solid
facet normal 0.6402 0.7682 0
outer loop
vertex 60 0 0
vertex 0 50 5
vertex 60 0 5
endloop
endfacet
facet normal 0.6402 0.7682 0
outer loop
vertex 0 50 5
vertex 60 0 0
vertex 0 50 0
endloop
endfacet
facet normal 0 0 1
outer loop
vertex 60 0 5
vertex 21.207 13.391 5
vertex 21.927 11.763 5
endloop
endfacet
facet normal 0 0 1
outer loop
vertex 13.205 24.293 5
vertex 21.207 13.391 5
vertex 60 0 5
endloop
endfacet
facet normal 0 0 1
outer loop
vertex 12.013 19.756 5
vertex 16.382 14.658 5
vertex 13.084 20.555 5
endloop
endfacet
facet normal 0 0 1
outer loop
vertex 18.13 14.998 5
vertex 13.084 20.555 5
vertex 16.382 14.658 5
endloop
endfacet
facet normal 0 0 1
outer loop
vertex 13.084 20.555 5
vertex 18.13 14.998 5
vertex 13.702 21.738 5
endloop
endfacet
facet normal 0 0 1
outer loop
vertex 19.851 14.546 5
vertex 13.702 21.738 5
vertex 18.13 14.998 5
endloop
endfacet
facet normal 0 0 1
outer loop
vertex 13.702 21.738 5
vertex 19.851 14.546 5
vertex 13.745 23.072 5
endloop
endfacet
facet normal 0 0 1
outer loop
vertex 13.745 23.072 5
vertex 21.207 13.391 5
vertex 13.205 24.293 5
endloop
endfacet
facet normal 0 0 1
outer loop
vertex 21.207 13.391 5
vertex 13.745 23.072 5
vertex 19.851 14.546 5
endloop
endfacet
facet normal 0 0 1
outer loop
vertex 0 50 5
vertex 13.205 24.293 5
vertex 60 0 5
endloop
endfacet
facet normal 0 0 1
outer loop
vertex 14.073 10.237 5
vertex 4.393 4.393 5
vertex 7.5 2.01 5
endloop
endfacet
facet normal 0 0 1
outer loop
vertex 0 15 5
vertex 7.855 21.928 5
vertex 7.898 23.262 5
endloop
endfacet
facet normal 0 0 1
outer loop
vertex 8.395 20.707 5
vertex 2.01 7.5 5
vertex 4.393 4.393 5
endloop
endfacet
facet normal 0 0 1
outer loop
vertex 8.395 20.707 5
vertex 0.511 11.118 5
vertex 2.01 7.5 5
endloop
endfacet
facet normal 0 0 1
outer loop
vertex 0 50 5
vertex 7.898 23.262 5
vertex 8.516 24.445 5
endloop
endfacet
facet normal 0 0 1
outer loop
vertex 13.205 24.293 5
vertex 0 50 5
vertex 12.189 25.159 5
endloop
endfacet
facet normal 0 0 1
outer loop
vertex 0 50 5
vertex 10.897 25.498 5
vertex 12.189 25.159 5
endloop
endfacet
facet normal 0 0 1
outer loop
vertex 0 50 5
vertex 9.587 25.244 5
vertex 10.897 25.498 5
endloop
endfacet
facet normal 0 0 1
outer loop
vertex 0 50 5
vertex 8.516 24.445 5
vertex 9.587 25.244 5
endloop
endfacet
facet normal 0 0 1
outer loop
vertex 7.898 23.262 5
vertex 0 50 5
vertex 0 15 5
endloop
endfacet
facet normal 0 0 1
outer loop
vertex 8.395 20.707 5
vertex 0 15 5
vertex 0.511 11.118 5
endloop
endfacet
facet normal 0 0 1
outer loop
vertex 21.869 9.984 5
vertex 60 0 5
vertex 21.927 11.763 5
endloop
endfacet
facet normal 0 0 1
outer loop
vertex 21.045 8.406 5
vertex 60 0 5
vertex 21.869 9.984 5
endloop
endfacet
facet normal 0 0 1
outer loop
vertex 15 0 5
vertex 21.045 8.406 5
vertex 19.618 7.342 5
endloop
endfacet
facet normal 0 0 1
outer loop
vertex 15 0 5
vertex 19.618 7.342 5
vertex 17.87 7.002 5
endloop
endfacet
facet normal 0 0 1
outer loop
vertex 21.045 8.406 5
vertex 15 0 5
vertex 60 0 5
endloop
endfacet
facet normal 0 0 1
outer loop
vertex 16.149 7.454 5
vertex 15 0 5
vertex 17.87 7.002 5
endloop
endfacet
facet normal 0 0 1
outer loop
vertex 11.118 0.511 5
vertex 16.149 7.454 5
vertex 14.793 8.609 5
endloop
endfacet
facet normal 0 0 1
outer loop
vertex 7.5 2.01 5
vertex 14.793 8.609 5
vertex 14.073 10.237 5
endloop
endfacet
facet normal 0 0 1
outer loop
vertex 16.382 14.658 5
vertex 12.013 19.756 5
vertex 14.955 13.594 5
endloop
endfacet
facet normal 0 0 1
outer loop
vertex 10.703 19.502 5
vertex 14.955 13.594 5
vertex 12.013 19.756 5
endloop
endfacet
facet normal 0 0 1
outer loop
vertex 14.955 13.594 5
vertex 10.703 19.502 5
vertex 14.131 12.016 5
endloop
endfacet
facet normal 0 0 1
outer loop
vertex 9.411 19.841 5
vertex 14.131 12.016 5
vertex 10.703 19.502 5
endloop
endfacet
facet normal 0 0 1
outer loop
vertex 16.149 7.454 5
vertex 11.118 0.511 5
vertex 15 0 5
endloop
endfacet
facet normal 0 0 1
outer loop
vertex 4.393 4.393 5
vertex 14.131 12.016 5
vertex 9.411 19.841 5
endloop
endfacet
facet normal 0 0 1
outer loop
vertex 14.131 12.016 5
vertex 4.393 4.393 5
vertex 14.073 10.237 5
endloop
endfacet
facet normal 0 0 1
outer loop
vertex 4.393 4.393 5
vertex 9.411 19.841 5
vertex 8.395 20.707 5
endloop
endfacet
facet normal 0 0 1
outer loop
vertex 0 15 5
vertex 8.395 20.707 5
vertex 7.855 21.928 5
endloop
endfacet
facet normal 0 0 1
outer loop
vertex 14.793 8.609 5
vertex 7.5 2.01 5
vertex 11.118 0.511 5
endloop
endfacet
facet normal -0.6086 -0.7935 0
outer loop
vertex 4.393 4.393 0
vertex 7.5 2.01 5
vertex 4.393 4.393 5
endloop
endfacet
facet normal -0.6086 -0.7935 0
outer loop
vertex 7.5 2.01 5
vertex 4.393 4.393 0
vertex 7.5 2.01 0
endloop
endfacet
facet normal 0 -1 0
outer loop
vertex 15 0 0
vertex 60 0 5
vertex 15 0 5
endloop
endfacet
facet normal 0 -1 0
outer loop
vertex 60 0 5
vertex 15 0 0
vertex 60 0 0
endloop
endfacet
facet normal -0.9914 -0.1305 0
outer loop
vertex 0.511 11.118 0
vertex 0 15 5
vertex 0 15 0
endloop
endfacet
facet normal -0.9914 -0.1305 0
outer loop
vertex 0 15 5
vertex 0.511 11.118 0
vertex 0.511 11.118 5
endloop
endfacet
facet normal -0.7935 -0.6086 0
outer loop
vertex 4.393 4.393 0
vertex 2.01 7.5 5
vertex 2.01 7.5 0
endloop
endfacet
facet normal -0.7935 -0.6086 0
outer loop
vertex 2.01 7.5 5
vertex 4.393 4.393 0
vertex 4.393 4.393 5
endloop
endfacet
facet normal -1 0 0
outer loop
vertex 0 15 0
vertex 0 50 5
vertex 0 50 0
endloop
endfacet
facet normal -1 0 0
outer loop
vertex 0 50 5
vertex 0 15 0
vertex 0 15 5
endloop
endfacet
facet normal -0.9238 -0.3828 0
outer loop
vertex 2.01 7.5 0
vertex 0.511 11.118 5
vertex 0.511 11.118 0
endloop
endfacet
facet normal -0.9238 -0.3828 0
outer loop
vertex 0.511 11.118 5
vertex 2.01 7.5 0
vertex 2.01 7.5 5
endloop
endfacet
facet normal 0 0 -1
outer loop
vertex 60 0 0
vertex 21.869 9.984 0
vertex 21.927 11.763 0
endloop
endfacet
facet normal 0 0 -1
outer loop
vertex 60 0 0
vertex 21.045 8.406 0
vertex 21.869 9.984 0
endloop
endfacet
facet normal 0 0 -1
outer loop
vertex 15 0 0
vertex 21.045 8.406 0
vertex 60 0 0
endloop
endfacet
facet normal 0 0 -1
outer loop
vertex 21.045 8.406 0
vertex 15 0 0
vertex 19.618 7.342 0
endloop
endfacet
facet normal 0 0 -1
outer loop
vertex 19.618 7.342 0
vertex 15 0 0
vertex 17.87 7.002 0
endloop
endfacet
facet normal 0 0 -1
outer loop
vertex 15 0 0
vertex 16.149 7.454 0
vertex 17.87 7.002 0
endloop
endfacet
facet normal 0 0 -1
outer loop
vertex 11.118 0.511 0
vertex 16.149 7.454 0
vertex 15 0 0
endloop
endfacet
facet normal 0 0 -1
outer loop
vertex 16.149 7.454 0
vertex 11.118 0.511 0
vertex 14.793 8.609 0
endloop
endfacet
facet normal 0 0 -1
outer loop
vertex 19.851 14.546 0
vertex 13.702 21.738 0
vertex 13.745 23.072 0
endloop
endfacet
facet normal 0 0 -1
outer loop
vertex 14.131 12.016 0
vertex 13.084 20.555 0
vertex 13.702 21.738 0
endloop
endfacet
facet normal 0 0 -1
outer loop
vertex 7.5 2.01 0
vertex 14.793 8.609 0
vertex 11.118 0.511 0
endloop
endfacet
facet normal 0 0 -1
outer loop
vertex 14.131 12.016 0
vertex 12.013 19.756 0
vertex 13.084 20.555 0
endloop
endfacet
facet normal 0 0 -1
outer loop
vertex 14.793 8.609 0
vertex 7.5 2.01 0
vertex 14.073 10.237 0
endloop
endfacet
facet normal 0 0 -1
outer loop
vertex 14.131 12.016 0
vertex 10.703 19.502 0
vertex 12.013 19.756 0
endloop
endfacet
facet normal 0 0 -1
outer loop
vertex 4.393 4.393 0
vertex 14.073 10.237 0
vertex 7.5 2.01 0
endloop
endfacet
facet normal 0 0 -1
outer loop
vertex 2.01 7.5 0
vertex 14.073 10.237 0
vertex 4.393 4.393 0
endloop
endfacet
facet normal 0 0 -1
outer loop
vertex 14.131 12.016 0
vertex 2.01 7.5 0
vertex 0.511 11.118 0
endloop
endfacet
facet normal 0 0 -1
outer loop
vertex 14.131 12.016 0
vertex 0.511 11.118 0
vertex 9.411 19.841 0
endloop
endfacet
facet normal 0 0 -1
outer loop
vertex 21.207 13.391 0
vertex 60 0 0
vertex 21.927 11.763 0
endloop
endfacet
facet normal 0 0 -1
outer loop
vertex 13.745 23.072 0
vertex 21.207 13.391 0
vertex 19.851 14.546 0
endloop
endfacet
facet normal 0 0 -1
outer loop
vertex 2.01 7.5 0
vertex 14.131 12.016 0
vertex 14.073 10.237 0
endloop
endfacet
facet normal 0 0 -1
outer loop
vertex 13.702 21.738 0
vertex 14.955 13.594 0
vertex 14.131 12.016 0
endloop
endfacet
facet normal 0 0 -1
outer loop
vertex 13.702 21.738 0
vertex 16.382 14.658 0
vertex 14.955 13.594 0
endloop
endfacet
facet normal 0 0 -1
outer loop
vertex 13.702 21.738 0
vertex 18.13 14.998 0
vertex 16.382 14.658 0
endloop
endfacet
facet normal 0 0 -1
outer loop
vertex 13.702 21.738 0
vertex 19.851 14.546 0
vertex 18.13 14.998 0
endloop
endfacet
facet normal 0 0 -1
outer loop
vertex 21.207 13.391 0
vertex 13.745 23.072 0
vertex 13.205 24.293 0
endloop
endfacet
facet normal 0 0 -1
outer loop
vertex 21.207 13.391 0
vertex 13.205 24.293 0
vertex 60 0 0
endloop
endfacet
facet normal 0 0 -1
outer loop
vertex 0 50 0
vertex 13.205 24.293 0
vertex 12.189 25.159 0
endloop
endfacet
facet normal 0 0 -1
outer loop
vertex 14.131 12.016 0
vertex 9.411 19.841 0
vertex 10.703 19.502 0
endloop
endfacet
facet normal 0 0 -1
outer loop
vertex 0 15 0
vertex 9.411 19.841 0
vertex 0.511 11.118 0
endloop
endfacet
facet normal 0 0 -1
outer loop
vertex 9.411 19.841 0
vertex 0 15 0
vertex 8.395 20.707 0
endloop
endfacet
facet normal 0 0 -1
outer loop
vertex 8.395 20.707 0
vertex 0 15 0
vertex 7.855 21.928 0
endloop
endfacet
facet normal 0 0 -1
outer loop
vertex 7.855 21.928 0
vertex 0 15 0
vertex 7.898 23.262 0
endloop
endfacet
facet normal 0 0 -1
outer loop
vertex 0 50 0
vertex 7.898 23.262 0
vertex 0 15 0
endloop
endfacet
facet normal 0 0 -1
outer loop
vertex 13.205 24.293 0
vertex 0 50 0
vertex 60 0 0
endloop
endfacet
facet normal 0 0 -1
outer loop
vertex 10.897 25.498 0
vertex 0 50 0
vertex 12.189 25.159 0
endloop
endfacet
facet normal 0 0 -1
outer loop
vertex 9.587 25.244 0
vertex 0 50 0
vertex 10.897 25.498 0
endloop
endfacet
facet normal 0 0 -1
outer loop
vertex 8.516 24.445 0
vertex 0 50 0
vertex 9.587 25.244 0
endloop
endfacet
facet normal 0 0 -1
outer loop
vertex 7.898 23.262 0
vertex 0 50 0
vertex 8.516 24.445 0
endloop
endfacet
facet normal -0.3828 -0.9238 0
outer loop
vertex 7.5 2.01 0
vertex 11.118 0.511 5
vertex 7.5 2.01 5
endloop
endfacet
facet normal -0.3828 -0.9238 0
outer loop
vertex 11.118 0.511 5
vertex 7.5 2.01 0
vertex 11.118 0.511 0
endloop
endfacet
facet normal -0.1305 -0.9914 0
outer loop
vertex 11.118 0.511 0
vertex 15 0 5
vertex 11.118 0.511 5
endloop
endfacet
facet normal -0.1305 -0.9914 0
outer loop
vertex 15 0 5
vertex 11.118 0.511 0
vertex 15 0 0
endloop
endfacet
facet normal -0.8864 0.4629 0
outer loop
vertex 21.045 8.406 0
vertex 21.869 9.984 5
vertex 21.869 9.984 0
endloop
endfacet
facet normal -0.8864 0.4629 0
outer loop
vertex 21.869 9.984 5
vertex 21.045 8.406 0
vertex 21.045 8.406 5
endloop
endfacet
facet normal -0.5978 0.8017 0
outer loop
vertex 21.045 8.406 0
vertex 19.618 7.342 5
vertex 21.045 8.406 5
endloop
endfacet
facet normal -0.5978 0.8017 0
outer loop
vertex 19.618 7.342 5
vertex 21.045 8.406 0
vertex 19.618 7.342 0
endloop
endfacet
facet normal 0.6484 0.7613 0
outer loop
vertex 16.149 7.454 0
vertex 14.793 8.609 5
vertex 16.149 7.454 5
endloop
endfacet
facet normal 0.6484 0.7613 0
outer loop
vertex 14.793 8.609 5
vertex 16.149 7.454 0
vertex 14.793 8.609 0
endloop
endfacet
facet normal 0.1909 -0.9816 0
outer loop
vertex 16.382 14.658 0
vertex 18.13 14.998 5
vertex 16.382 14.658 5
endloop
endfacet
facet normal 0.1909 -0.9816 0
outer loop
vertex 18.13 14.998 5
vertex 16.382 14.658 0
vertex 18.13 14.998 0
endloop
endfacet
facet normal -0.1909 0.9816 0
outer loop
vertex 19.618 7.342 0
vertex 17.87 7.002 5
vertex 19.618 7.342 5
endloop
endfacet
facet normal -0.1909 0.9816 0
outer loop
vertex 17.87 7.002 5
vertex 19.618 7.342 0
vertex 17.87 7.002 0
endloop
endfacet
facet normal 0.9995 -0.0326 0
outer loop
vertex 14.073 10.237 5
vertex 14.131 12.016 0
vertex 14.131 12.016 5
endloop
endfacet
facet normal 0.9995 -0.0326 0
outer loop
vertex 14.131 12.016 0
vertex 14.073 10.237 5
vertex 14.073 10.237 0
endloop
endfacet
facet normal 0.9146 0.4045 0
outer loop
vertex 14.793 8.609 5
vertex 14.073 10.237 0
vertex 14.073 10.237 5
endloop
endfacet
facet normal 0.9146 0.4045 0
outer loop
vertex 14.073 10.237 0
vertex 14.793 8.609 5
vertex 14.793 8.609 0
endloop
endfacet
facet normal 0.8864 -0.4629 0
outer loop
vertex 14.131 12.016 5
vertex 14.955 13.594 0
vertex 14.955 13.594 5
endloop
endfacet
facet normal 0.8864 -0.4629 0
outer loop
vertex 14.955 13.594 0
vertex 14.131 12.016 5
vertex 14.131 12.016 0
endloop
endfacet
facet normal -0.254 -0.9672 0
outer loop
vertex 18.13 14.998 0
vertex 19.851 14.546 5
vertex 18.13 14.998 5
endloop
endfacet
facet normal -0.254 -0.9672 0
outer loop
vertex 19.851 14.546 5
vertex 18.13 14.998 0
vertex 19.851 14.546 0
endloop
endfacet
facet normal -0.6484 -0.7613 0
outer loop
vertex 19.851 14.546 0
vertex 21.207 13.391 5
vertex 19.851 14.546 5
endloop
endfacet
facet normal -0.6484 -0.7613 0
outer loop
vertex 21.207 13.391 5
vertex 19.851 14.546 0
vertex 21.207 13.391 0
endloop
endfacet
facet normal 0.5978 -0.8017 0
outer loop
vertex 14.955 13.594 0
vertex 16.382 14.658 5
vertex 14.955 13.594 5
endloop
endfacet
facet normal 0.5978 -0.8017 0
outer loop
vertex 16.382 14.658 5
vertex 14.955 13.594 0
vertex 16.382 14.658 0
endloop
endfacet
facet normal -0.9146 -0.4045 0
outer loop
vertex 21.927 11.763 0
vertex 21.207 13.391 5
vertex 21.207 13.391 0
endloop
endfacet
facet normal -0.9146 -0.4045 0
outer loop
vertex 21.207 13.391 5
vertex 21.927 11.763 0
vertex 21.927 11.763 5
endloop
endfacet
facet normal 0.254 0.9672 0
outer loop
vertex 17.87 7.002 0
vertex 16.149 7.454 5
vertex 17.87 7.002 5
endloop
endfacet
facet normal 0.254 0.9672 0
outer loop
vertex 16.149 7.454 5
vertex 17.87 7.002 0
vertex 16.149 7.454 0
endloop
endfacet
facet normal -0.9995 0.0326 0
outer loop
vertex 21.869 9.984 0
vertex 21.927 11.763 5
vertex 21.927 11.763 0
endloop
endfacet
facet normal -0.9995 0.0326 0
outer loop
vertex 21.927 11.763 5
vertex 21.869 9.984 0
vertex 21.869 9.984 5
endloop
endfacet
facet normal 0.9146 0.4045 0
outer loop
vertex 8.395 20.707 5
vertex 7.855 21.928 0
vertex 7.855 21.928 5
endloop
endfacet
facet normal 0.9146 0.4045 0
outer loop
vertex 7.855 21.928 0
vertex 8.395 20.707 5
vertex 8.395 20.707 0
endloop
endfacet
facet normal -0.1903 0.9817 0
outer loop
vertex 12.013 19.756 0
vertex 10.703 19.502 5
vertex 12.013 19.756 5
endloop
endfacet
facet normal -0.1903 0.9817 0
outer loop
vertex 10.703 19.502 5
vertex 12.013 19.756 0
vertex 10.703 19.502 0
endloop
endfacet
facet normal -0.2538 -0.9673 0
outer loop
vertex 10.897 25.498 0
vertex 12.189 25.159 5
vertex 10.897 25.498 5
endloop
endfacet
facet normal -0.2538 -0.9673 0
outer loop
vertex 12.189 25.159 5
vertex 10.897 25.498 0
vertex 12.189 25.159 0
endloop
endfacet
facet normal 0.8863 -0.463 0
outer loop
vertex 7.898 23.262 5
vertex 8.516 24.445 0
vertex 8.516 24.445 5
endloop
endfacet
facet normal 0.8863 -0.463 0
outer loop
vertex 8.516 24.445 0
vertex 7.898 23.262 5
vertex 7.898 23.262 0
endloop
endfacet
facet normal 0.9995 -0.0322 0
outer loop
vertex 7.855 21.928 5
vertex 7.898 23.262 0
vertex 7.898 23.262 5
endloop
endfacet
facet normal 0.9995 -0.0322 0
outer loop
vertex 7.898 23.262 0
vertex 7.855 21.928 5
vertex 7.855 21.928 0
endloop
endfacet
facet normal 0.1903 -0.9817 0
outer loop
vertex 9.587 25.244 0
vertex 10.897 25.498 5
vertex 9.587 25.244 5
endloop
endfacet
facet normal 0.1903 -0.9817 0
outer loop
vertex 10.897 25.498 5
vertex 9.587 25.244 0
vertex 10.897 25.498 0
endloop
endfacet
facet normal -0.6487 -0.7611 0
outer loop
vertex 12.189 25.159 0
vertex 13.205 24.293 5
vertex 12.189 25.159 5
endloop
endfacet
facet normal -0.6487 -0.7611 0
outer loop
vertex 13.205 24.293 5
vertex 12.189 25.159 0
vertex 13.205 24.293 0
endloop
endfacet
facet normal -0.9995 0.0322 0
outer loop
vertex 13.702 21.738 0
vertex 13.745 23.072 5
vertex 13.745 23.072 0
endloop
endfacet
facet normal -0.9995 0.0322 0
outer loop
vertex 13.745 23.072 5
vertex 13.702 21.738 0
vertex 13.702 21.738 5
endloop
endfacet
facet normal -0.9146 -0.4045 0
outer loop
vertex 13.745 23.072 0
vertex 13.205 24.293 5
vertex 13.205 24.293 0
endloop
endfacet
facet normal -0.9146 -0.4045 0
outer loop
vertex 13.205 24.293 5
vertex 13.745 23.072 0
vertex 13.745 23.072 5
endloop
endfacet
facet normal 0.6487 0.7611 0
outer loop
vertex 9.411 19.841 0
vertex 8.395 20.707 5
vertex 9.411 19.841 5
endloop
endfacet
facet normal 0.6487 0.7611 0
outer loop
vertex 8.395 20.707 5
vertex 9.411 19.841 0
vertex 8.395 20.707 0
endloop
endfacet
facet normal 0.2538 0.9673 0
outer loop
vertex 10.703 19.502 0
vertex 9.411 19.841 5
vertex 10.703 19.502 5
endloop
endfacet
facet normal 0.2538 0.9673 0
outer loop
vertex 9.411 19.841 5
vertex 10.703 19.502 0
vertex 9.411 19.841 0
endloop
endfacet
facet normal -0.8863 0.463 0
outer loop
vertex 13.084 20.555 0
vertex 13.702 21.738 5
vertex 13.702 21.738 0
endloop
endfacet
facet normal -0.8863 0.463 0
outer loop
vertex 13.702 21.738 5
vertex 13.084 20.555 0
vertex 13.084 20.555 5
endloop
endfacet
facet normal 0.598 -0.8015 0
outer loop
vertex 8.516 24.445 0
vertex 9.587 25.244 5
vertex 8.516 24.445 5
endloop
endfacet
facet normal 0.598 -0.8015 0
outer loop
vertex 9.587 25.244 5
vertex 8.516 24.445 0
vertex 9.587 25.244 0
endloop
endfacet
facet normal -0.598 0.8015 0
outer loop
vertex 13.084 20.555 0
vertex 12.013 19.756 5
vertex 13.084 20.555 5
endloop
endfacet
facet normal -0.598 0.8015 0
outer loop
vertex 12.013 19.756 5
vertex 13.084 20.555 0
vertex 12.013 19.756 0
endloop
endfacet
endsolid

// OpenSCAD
$fn = 32;

// ----------------------------------------------------------------------
// Bracket plate: corner pad 60 x 50, fillet R15
// ----------------------------------------------------------------------

// --- parameters (mm) ---
hole_r = 3;               // bolt hole radius
plate_t = 5;              // plate thickness, Z (extrusion height)
leg_a = 60;               // base leg
leg_b = 50;               // height leg
fillet_r = 15;            // right-angle fillet radius

hole_d1 = 2 * hole_r + 2;
hole_d2 = 2 * hole_r;

profile = [[15, 0], [60, 0], [0, 50], [0, 15], [0.511, 11.118], [2.01, 7.5], [4.393, 4.393], [7.5, 2.01], [11.118, 0.511]];  // primary outline, 9 points, counter clockwise
void_1 = [[21.927, 11.763], [21.207, 13.391], [19.851, 14.546], [18.13, 14.998], [16.382, 14.658], [14.955, 13.594], [14.131, 12.016], [14.073, 10.237], [14.793, 8.609], [16.149, 7.454], [17.87, 7.002], [19.618, 7.342], [21.045, 8.406], [21.869, 9.984]];  // mount hole 1, 14 points
void_2 = [[13.745, 23.072], [13.205, 24.293], [12.189, 25.159], [10.897, 25.498], [9.587, 25.244], [8.516, 24.445], [7.898, 23.262], [7.855, 21.928], [8.395, 20.707], [9.411, 19.841], [10.703, 19.502], [12.013, 19.756], [13.084, 20.555], [13.702, 21.738]];  // mount hole 2, 14 points

// --- the one profile operation ---
difference() {
  linear_extrude(height = plate_t) polygon(points = profile);
  translate([0, 0, -1])
    linear_extrude(height = plate_t + 2) polygon(points = void_1);
  translate([0, 0, -1])
    linear_extrude(height = plate_t + 2) polygon(points = void_2);
}
